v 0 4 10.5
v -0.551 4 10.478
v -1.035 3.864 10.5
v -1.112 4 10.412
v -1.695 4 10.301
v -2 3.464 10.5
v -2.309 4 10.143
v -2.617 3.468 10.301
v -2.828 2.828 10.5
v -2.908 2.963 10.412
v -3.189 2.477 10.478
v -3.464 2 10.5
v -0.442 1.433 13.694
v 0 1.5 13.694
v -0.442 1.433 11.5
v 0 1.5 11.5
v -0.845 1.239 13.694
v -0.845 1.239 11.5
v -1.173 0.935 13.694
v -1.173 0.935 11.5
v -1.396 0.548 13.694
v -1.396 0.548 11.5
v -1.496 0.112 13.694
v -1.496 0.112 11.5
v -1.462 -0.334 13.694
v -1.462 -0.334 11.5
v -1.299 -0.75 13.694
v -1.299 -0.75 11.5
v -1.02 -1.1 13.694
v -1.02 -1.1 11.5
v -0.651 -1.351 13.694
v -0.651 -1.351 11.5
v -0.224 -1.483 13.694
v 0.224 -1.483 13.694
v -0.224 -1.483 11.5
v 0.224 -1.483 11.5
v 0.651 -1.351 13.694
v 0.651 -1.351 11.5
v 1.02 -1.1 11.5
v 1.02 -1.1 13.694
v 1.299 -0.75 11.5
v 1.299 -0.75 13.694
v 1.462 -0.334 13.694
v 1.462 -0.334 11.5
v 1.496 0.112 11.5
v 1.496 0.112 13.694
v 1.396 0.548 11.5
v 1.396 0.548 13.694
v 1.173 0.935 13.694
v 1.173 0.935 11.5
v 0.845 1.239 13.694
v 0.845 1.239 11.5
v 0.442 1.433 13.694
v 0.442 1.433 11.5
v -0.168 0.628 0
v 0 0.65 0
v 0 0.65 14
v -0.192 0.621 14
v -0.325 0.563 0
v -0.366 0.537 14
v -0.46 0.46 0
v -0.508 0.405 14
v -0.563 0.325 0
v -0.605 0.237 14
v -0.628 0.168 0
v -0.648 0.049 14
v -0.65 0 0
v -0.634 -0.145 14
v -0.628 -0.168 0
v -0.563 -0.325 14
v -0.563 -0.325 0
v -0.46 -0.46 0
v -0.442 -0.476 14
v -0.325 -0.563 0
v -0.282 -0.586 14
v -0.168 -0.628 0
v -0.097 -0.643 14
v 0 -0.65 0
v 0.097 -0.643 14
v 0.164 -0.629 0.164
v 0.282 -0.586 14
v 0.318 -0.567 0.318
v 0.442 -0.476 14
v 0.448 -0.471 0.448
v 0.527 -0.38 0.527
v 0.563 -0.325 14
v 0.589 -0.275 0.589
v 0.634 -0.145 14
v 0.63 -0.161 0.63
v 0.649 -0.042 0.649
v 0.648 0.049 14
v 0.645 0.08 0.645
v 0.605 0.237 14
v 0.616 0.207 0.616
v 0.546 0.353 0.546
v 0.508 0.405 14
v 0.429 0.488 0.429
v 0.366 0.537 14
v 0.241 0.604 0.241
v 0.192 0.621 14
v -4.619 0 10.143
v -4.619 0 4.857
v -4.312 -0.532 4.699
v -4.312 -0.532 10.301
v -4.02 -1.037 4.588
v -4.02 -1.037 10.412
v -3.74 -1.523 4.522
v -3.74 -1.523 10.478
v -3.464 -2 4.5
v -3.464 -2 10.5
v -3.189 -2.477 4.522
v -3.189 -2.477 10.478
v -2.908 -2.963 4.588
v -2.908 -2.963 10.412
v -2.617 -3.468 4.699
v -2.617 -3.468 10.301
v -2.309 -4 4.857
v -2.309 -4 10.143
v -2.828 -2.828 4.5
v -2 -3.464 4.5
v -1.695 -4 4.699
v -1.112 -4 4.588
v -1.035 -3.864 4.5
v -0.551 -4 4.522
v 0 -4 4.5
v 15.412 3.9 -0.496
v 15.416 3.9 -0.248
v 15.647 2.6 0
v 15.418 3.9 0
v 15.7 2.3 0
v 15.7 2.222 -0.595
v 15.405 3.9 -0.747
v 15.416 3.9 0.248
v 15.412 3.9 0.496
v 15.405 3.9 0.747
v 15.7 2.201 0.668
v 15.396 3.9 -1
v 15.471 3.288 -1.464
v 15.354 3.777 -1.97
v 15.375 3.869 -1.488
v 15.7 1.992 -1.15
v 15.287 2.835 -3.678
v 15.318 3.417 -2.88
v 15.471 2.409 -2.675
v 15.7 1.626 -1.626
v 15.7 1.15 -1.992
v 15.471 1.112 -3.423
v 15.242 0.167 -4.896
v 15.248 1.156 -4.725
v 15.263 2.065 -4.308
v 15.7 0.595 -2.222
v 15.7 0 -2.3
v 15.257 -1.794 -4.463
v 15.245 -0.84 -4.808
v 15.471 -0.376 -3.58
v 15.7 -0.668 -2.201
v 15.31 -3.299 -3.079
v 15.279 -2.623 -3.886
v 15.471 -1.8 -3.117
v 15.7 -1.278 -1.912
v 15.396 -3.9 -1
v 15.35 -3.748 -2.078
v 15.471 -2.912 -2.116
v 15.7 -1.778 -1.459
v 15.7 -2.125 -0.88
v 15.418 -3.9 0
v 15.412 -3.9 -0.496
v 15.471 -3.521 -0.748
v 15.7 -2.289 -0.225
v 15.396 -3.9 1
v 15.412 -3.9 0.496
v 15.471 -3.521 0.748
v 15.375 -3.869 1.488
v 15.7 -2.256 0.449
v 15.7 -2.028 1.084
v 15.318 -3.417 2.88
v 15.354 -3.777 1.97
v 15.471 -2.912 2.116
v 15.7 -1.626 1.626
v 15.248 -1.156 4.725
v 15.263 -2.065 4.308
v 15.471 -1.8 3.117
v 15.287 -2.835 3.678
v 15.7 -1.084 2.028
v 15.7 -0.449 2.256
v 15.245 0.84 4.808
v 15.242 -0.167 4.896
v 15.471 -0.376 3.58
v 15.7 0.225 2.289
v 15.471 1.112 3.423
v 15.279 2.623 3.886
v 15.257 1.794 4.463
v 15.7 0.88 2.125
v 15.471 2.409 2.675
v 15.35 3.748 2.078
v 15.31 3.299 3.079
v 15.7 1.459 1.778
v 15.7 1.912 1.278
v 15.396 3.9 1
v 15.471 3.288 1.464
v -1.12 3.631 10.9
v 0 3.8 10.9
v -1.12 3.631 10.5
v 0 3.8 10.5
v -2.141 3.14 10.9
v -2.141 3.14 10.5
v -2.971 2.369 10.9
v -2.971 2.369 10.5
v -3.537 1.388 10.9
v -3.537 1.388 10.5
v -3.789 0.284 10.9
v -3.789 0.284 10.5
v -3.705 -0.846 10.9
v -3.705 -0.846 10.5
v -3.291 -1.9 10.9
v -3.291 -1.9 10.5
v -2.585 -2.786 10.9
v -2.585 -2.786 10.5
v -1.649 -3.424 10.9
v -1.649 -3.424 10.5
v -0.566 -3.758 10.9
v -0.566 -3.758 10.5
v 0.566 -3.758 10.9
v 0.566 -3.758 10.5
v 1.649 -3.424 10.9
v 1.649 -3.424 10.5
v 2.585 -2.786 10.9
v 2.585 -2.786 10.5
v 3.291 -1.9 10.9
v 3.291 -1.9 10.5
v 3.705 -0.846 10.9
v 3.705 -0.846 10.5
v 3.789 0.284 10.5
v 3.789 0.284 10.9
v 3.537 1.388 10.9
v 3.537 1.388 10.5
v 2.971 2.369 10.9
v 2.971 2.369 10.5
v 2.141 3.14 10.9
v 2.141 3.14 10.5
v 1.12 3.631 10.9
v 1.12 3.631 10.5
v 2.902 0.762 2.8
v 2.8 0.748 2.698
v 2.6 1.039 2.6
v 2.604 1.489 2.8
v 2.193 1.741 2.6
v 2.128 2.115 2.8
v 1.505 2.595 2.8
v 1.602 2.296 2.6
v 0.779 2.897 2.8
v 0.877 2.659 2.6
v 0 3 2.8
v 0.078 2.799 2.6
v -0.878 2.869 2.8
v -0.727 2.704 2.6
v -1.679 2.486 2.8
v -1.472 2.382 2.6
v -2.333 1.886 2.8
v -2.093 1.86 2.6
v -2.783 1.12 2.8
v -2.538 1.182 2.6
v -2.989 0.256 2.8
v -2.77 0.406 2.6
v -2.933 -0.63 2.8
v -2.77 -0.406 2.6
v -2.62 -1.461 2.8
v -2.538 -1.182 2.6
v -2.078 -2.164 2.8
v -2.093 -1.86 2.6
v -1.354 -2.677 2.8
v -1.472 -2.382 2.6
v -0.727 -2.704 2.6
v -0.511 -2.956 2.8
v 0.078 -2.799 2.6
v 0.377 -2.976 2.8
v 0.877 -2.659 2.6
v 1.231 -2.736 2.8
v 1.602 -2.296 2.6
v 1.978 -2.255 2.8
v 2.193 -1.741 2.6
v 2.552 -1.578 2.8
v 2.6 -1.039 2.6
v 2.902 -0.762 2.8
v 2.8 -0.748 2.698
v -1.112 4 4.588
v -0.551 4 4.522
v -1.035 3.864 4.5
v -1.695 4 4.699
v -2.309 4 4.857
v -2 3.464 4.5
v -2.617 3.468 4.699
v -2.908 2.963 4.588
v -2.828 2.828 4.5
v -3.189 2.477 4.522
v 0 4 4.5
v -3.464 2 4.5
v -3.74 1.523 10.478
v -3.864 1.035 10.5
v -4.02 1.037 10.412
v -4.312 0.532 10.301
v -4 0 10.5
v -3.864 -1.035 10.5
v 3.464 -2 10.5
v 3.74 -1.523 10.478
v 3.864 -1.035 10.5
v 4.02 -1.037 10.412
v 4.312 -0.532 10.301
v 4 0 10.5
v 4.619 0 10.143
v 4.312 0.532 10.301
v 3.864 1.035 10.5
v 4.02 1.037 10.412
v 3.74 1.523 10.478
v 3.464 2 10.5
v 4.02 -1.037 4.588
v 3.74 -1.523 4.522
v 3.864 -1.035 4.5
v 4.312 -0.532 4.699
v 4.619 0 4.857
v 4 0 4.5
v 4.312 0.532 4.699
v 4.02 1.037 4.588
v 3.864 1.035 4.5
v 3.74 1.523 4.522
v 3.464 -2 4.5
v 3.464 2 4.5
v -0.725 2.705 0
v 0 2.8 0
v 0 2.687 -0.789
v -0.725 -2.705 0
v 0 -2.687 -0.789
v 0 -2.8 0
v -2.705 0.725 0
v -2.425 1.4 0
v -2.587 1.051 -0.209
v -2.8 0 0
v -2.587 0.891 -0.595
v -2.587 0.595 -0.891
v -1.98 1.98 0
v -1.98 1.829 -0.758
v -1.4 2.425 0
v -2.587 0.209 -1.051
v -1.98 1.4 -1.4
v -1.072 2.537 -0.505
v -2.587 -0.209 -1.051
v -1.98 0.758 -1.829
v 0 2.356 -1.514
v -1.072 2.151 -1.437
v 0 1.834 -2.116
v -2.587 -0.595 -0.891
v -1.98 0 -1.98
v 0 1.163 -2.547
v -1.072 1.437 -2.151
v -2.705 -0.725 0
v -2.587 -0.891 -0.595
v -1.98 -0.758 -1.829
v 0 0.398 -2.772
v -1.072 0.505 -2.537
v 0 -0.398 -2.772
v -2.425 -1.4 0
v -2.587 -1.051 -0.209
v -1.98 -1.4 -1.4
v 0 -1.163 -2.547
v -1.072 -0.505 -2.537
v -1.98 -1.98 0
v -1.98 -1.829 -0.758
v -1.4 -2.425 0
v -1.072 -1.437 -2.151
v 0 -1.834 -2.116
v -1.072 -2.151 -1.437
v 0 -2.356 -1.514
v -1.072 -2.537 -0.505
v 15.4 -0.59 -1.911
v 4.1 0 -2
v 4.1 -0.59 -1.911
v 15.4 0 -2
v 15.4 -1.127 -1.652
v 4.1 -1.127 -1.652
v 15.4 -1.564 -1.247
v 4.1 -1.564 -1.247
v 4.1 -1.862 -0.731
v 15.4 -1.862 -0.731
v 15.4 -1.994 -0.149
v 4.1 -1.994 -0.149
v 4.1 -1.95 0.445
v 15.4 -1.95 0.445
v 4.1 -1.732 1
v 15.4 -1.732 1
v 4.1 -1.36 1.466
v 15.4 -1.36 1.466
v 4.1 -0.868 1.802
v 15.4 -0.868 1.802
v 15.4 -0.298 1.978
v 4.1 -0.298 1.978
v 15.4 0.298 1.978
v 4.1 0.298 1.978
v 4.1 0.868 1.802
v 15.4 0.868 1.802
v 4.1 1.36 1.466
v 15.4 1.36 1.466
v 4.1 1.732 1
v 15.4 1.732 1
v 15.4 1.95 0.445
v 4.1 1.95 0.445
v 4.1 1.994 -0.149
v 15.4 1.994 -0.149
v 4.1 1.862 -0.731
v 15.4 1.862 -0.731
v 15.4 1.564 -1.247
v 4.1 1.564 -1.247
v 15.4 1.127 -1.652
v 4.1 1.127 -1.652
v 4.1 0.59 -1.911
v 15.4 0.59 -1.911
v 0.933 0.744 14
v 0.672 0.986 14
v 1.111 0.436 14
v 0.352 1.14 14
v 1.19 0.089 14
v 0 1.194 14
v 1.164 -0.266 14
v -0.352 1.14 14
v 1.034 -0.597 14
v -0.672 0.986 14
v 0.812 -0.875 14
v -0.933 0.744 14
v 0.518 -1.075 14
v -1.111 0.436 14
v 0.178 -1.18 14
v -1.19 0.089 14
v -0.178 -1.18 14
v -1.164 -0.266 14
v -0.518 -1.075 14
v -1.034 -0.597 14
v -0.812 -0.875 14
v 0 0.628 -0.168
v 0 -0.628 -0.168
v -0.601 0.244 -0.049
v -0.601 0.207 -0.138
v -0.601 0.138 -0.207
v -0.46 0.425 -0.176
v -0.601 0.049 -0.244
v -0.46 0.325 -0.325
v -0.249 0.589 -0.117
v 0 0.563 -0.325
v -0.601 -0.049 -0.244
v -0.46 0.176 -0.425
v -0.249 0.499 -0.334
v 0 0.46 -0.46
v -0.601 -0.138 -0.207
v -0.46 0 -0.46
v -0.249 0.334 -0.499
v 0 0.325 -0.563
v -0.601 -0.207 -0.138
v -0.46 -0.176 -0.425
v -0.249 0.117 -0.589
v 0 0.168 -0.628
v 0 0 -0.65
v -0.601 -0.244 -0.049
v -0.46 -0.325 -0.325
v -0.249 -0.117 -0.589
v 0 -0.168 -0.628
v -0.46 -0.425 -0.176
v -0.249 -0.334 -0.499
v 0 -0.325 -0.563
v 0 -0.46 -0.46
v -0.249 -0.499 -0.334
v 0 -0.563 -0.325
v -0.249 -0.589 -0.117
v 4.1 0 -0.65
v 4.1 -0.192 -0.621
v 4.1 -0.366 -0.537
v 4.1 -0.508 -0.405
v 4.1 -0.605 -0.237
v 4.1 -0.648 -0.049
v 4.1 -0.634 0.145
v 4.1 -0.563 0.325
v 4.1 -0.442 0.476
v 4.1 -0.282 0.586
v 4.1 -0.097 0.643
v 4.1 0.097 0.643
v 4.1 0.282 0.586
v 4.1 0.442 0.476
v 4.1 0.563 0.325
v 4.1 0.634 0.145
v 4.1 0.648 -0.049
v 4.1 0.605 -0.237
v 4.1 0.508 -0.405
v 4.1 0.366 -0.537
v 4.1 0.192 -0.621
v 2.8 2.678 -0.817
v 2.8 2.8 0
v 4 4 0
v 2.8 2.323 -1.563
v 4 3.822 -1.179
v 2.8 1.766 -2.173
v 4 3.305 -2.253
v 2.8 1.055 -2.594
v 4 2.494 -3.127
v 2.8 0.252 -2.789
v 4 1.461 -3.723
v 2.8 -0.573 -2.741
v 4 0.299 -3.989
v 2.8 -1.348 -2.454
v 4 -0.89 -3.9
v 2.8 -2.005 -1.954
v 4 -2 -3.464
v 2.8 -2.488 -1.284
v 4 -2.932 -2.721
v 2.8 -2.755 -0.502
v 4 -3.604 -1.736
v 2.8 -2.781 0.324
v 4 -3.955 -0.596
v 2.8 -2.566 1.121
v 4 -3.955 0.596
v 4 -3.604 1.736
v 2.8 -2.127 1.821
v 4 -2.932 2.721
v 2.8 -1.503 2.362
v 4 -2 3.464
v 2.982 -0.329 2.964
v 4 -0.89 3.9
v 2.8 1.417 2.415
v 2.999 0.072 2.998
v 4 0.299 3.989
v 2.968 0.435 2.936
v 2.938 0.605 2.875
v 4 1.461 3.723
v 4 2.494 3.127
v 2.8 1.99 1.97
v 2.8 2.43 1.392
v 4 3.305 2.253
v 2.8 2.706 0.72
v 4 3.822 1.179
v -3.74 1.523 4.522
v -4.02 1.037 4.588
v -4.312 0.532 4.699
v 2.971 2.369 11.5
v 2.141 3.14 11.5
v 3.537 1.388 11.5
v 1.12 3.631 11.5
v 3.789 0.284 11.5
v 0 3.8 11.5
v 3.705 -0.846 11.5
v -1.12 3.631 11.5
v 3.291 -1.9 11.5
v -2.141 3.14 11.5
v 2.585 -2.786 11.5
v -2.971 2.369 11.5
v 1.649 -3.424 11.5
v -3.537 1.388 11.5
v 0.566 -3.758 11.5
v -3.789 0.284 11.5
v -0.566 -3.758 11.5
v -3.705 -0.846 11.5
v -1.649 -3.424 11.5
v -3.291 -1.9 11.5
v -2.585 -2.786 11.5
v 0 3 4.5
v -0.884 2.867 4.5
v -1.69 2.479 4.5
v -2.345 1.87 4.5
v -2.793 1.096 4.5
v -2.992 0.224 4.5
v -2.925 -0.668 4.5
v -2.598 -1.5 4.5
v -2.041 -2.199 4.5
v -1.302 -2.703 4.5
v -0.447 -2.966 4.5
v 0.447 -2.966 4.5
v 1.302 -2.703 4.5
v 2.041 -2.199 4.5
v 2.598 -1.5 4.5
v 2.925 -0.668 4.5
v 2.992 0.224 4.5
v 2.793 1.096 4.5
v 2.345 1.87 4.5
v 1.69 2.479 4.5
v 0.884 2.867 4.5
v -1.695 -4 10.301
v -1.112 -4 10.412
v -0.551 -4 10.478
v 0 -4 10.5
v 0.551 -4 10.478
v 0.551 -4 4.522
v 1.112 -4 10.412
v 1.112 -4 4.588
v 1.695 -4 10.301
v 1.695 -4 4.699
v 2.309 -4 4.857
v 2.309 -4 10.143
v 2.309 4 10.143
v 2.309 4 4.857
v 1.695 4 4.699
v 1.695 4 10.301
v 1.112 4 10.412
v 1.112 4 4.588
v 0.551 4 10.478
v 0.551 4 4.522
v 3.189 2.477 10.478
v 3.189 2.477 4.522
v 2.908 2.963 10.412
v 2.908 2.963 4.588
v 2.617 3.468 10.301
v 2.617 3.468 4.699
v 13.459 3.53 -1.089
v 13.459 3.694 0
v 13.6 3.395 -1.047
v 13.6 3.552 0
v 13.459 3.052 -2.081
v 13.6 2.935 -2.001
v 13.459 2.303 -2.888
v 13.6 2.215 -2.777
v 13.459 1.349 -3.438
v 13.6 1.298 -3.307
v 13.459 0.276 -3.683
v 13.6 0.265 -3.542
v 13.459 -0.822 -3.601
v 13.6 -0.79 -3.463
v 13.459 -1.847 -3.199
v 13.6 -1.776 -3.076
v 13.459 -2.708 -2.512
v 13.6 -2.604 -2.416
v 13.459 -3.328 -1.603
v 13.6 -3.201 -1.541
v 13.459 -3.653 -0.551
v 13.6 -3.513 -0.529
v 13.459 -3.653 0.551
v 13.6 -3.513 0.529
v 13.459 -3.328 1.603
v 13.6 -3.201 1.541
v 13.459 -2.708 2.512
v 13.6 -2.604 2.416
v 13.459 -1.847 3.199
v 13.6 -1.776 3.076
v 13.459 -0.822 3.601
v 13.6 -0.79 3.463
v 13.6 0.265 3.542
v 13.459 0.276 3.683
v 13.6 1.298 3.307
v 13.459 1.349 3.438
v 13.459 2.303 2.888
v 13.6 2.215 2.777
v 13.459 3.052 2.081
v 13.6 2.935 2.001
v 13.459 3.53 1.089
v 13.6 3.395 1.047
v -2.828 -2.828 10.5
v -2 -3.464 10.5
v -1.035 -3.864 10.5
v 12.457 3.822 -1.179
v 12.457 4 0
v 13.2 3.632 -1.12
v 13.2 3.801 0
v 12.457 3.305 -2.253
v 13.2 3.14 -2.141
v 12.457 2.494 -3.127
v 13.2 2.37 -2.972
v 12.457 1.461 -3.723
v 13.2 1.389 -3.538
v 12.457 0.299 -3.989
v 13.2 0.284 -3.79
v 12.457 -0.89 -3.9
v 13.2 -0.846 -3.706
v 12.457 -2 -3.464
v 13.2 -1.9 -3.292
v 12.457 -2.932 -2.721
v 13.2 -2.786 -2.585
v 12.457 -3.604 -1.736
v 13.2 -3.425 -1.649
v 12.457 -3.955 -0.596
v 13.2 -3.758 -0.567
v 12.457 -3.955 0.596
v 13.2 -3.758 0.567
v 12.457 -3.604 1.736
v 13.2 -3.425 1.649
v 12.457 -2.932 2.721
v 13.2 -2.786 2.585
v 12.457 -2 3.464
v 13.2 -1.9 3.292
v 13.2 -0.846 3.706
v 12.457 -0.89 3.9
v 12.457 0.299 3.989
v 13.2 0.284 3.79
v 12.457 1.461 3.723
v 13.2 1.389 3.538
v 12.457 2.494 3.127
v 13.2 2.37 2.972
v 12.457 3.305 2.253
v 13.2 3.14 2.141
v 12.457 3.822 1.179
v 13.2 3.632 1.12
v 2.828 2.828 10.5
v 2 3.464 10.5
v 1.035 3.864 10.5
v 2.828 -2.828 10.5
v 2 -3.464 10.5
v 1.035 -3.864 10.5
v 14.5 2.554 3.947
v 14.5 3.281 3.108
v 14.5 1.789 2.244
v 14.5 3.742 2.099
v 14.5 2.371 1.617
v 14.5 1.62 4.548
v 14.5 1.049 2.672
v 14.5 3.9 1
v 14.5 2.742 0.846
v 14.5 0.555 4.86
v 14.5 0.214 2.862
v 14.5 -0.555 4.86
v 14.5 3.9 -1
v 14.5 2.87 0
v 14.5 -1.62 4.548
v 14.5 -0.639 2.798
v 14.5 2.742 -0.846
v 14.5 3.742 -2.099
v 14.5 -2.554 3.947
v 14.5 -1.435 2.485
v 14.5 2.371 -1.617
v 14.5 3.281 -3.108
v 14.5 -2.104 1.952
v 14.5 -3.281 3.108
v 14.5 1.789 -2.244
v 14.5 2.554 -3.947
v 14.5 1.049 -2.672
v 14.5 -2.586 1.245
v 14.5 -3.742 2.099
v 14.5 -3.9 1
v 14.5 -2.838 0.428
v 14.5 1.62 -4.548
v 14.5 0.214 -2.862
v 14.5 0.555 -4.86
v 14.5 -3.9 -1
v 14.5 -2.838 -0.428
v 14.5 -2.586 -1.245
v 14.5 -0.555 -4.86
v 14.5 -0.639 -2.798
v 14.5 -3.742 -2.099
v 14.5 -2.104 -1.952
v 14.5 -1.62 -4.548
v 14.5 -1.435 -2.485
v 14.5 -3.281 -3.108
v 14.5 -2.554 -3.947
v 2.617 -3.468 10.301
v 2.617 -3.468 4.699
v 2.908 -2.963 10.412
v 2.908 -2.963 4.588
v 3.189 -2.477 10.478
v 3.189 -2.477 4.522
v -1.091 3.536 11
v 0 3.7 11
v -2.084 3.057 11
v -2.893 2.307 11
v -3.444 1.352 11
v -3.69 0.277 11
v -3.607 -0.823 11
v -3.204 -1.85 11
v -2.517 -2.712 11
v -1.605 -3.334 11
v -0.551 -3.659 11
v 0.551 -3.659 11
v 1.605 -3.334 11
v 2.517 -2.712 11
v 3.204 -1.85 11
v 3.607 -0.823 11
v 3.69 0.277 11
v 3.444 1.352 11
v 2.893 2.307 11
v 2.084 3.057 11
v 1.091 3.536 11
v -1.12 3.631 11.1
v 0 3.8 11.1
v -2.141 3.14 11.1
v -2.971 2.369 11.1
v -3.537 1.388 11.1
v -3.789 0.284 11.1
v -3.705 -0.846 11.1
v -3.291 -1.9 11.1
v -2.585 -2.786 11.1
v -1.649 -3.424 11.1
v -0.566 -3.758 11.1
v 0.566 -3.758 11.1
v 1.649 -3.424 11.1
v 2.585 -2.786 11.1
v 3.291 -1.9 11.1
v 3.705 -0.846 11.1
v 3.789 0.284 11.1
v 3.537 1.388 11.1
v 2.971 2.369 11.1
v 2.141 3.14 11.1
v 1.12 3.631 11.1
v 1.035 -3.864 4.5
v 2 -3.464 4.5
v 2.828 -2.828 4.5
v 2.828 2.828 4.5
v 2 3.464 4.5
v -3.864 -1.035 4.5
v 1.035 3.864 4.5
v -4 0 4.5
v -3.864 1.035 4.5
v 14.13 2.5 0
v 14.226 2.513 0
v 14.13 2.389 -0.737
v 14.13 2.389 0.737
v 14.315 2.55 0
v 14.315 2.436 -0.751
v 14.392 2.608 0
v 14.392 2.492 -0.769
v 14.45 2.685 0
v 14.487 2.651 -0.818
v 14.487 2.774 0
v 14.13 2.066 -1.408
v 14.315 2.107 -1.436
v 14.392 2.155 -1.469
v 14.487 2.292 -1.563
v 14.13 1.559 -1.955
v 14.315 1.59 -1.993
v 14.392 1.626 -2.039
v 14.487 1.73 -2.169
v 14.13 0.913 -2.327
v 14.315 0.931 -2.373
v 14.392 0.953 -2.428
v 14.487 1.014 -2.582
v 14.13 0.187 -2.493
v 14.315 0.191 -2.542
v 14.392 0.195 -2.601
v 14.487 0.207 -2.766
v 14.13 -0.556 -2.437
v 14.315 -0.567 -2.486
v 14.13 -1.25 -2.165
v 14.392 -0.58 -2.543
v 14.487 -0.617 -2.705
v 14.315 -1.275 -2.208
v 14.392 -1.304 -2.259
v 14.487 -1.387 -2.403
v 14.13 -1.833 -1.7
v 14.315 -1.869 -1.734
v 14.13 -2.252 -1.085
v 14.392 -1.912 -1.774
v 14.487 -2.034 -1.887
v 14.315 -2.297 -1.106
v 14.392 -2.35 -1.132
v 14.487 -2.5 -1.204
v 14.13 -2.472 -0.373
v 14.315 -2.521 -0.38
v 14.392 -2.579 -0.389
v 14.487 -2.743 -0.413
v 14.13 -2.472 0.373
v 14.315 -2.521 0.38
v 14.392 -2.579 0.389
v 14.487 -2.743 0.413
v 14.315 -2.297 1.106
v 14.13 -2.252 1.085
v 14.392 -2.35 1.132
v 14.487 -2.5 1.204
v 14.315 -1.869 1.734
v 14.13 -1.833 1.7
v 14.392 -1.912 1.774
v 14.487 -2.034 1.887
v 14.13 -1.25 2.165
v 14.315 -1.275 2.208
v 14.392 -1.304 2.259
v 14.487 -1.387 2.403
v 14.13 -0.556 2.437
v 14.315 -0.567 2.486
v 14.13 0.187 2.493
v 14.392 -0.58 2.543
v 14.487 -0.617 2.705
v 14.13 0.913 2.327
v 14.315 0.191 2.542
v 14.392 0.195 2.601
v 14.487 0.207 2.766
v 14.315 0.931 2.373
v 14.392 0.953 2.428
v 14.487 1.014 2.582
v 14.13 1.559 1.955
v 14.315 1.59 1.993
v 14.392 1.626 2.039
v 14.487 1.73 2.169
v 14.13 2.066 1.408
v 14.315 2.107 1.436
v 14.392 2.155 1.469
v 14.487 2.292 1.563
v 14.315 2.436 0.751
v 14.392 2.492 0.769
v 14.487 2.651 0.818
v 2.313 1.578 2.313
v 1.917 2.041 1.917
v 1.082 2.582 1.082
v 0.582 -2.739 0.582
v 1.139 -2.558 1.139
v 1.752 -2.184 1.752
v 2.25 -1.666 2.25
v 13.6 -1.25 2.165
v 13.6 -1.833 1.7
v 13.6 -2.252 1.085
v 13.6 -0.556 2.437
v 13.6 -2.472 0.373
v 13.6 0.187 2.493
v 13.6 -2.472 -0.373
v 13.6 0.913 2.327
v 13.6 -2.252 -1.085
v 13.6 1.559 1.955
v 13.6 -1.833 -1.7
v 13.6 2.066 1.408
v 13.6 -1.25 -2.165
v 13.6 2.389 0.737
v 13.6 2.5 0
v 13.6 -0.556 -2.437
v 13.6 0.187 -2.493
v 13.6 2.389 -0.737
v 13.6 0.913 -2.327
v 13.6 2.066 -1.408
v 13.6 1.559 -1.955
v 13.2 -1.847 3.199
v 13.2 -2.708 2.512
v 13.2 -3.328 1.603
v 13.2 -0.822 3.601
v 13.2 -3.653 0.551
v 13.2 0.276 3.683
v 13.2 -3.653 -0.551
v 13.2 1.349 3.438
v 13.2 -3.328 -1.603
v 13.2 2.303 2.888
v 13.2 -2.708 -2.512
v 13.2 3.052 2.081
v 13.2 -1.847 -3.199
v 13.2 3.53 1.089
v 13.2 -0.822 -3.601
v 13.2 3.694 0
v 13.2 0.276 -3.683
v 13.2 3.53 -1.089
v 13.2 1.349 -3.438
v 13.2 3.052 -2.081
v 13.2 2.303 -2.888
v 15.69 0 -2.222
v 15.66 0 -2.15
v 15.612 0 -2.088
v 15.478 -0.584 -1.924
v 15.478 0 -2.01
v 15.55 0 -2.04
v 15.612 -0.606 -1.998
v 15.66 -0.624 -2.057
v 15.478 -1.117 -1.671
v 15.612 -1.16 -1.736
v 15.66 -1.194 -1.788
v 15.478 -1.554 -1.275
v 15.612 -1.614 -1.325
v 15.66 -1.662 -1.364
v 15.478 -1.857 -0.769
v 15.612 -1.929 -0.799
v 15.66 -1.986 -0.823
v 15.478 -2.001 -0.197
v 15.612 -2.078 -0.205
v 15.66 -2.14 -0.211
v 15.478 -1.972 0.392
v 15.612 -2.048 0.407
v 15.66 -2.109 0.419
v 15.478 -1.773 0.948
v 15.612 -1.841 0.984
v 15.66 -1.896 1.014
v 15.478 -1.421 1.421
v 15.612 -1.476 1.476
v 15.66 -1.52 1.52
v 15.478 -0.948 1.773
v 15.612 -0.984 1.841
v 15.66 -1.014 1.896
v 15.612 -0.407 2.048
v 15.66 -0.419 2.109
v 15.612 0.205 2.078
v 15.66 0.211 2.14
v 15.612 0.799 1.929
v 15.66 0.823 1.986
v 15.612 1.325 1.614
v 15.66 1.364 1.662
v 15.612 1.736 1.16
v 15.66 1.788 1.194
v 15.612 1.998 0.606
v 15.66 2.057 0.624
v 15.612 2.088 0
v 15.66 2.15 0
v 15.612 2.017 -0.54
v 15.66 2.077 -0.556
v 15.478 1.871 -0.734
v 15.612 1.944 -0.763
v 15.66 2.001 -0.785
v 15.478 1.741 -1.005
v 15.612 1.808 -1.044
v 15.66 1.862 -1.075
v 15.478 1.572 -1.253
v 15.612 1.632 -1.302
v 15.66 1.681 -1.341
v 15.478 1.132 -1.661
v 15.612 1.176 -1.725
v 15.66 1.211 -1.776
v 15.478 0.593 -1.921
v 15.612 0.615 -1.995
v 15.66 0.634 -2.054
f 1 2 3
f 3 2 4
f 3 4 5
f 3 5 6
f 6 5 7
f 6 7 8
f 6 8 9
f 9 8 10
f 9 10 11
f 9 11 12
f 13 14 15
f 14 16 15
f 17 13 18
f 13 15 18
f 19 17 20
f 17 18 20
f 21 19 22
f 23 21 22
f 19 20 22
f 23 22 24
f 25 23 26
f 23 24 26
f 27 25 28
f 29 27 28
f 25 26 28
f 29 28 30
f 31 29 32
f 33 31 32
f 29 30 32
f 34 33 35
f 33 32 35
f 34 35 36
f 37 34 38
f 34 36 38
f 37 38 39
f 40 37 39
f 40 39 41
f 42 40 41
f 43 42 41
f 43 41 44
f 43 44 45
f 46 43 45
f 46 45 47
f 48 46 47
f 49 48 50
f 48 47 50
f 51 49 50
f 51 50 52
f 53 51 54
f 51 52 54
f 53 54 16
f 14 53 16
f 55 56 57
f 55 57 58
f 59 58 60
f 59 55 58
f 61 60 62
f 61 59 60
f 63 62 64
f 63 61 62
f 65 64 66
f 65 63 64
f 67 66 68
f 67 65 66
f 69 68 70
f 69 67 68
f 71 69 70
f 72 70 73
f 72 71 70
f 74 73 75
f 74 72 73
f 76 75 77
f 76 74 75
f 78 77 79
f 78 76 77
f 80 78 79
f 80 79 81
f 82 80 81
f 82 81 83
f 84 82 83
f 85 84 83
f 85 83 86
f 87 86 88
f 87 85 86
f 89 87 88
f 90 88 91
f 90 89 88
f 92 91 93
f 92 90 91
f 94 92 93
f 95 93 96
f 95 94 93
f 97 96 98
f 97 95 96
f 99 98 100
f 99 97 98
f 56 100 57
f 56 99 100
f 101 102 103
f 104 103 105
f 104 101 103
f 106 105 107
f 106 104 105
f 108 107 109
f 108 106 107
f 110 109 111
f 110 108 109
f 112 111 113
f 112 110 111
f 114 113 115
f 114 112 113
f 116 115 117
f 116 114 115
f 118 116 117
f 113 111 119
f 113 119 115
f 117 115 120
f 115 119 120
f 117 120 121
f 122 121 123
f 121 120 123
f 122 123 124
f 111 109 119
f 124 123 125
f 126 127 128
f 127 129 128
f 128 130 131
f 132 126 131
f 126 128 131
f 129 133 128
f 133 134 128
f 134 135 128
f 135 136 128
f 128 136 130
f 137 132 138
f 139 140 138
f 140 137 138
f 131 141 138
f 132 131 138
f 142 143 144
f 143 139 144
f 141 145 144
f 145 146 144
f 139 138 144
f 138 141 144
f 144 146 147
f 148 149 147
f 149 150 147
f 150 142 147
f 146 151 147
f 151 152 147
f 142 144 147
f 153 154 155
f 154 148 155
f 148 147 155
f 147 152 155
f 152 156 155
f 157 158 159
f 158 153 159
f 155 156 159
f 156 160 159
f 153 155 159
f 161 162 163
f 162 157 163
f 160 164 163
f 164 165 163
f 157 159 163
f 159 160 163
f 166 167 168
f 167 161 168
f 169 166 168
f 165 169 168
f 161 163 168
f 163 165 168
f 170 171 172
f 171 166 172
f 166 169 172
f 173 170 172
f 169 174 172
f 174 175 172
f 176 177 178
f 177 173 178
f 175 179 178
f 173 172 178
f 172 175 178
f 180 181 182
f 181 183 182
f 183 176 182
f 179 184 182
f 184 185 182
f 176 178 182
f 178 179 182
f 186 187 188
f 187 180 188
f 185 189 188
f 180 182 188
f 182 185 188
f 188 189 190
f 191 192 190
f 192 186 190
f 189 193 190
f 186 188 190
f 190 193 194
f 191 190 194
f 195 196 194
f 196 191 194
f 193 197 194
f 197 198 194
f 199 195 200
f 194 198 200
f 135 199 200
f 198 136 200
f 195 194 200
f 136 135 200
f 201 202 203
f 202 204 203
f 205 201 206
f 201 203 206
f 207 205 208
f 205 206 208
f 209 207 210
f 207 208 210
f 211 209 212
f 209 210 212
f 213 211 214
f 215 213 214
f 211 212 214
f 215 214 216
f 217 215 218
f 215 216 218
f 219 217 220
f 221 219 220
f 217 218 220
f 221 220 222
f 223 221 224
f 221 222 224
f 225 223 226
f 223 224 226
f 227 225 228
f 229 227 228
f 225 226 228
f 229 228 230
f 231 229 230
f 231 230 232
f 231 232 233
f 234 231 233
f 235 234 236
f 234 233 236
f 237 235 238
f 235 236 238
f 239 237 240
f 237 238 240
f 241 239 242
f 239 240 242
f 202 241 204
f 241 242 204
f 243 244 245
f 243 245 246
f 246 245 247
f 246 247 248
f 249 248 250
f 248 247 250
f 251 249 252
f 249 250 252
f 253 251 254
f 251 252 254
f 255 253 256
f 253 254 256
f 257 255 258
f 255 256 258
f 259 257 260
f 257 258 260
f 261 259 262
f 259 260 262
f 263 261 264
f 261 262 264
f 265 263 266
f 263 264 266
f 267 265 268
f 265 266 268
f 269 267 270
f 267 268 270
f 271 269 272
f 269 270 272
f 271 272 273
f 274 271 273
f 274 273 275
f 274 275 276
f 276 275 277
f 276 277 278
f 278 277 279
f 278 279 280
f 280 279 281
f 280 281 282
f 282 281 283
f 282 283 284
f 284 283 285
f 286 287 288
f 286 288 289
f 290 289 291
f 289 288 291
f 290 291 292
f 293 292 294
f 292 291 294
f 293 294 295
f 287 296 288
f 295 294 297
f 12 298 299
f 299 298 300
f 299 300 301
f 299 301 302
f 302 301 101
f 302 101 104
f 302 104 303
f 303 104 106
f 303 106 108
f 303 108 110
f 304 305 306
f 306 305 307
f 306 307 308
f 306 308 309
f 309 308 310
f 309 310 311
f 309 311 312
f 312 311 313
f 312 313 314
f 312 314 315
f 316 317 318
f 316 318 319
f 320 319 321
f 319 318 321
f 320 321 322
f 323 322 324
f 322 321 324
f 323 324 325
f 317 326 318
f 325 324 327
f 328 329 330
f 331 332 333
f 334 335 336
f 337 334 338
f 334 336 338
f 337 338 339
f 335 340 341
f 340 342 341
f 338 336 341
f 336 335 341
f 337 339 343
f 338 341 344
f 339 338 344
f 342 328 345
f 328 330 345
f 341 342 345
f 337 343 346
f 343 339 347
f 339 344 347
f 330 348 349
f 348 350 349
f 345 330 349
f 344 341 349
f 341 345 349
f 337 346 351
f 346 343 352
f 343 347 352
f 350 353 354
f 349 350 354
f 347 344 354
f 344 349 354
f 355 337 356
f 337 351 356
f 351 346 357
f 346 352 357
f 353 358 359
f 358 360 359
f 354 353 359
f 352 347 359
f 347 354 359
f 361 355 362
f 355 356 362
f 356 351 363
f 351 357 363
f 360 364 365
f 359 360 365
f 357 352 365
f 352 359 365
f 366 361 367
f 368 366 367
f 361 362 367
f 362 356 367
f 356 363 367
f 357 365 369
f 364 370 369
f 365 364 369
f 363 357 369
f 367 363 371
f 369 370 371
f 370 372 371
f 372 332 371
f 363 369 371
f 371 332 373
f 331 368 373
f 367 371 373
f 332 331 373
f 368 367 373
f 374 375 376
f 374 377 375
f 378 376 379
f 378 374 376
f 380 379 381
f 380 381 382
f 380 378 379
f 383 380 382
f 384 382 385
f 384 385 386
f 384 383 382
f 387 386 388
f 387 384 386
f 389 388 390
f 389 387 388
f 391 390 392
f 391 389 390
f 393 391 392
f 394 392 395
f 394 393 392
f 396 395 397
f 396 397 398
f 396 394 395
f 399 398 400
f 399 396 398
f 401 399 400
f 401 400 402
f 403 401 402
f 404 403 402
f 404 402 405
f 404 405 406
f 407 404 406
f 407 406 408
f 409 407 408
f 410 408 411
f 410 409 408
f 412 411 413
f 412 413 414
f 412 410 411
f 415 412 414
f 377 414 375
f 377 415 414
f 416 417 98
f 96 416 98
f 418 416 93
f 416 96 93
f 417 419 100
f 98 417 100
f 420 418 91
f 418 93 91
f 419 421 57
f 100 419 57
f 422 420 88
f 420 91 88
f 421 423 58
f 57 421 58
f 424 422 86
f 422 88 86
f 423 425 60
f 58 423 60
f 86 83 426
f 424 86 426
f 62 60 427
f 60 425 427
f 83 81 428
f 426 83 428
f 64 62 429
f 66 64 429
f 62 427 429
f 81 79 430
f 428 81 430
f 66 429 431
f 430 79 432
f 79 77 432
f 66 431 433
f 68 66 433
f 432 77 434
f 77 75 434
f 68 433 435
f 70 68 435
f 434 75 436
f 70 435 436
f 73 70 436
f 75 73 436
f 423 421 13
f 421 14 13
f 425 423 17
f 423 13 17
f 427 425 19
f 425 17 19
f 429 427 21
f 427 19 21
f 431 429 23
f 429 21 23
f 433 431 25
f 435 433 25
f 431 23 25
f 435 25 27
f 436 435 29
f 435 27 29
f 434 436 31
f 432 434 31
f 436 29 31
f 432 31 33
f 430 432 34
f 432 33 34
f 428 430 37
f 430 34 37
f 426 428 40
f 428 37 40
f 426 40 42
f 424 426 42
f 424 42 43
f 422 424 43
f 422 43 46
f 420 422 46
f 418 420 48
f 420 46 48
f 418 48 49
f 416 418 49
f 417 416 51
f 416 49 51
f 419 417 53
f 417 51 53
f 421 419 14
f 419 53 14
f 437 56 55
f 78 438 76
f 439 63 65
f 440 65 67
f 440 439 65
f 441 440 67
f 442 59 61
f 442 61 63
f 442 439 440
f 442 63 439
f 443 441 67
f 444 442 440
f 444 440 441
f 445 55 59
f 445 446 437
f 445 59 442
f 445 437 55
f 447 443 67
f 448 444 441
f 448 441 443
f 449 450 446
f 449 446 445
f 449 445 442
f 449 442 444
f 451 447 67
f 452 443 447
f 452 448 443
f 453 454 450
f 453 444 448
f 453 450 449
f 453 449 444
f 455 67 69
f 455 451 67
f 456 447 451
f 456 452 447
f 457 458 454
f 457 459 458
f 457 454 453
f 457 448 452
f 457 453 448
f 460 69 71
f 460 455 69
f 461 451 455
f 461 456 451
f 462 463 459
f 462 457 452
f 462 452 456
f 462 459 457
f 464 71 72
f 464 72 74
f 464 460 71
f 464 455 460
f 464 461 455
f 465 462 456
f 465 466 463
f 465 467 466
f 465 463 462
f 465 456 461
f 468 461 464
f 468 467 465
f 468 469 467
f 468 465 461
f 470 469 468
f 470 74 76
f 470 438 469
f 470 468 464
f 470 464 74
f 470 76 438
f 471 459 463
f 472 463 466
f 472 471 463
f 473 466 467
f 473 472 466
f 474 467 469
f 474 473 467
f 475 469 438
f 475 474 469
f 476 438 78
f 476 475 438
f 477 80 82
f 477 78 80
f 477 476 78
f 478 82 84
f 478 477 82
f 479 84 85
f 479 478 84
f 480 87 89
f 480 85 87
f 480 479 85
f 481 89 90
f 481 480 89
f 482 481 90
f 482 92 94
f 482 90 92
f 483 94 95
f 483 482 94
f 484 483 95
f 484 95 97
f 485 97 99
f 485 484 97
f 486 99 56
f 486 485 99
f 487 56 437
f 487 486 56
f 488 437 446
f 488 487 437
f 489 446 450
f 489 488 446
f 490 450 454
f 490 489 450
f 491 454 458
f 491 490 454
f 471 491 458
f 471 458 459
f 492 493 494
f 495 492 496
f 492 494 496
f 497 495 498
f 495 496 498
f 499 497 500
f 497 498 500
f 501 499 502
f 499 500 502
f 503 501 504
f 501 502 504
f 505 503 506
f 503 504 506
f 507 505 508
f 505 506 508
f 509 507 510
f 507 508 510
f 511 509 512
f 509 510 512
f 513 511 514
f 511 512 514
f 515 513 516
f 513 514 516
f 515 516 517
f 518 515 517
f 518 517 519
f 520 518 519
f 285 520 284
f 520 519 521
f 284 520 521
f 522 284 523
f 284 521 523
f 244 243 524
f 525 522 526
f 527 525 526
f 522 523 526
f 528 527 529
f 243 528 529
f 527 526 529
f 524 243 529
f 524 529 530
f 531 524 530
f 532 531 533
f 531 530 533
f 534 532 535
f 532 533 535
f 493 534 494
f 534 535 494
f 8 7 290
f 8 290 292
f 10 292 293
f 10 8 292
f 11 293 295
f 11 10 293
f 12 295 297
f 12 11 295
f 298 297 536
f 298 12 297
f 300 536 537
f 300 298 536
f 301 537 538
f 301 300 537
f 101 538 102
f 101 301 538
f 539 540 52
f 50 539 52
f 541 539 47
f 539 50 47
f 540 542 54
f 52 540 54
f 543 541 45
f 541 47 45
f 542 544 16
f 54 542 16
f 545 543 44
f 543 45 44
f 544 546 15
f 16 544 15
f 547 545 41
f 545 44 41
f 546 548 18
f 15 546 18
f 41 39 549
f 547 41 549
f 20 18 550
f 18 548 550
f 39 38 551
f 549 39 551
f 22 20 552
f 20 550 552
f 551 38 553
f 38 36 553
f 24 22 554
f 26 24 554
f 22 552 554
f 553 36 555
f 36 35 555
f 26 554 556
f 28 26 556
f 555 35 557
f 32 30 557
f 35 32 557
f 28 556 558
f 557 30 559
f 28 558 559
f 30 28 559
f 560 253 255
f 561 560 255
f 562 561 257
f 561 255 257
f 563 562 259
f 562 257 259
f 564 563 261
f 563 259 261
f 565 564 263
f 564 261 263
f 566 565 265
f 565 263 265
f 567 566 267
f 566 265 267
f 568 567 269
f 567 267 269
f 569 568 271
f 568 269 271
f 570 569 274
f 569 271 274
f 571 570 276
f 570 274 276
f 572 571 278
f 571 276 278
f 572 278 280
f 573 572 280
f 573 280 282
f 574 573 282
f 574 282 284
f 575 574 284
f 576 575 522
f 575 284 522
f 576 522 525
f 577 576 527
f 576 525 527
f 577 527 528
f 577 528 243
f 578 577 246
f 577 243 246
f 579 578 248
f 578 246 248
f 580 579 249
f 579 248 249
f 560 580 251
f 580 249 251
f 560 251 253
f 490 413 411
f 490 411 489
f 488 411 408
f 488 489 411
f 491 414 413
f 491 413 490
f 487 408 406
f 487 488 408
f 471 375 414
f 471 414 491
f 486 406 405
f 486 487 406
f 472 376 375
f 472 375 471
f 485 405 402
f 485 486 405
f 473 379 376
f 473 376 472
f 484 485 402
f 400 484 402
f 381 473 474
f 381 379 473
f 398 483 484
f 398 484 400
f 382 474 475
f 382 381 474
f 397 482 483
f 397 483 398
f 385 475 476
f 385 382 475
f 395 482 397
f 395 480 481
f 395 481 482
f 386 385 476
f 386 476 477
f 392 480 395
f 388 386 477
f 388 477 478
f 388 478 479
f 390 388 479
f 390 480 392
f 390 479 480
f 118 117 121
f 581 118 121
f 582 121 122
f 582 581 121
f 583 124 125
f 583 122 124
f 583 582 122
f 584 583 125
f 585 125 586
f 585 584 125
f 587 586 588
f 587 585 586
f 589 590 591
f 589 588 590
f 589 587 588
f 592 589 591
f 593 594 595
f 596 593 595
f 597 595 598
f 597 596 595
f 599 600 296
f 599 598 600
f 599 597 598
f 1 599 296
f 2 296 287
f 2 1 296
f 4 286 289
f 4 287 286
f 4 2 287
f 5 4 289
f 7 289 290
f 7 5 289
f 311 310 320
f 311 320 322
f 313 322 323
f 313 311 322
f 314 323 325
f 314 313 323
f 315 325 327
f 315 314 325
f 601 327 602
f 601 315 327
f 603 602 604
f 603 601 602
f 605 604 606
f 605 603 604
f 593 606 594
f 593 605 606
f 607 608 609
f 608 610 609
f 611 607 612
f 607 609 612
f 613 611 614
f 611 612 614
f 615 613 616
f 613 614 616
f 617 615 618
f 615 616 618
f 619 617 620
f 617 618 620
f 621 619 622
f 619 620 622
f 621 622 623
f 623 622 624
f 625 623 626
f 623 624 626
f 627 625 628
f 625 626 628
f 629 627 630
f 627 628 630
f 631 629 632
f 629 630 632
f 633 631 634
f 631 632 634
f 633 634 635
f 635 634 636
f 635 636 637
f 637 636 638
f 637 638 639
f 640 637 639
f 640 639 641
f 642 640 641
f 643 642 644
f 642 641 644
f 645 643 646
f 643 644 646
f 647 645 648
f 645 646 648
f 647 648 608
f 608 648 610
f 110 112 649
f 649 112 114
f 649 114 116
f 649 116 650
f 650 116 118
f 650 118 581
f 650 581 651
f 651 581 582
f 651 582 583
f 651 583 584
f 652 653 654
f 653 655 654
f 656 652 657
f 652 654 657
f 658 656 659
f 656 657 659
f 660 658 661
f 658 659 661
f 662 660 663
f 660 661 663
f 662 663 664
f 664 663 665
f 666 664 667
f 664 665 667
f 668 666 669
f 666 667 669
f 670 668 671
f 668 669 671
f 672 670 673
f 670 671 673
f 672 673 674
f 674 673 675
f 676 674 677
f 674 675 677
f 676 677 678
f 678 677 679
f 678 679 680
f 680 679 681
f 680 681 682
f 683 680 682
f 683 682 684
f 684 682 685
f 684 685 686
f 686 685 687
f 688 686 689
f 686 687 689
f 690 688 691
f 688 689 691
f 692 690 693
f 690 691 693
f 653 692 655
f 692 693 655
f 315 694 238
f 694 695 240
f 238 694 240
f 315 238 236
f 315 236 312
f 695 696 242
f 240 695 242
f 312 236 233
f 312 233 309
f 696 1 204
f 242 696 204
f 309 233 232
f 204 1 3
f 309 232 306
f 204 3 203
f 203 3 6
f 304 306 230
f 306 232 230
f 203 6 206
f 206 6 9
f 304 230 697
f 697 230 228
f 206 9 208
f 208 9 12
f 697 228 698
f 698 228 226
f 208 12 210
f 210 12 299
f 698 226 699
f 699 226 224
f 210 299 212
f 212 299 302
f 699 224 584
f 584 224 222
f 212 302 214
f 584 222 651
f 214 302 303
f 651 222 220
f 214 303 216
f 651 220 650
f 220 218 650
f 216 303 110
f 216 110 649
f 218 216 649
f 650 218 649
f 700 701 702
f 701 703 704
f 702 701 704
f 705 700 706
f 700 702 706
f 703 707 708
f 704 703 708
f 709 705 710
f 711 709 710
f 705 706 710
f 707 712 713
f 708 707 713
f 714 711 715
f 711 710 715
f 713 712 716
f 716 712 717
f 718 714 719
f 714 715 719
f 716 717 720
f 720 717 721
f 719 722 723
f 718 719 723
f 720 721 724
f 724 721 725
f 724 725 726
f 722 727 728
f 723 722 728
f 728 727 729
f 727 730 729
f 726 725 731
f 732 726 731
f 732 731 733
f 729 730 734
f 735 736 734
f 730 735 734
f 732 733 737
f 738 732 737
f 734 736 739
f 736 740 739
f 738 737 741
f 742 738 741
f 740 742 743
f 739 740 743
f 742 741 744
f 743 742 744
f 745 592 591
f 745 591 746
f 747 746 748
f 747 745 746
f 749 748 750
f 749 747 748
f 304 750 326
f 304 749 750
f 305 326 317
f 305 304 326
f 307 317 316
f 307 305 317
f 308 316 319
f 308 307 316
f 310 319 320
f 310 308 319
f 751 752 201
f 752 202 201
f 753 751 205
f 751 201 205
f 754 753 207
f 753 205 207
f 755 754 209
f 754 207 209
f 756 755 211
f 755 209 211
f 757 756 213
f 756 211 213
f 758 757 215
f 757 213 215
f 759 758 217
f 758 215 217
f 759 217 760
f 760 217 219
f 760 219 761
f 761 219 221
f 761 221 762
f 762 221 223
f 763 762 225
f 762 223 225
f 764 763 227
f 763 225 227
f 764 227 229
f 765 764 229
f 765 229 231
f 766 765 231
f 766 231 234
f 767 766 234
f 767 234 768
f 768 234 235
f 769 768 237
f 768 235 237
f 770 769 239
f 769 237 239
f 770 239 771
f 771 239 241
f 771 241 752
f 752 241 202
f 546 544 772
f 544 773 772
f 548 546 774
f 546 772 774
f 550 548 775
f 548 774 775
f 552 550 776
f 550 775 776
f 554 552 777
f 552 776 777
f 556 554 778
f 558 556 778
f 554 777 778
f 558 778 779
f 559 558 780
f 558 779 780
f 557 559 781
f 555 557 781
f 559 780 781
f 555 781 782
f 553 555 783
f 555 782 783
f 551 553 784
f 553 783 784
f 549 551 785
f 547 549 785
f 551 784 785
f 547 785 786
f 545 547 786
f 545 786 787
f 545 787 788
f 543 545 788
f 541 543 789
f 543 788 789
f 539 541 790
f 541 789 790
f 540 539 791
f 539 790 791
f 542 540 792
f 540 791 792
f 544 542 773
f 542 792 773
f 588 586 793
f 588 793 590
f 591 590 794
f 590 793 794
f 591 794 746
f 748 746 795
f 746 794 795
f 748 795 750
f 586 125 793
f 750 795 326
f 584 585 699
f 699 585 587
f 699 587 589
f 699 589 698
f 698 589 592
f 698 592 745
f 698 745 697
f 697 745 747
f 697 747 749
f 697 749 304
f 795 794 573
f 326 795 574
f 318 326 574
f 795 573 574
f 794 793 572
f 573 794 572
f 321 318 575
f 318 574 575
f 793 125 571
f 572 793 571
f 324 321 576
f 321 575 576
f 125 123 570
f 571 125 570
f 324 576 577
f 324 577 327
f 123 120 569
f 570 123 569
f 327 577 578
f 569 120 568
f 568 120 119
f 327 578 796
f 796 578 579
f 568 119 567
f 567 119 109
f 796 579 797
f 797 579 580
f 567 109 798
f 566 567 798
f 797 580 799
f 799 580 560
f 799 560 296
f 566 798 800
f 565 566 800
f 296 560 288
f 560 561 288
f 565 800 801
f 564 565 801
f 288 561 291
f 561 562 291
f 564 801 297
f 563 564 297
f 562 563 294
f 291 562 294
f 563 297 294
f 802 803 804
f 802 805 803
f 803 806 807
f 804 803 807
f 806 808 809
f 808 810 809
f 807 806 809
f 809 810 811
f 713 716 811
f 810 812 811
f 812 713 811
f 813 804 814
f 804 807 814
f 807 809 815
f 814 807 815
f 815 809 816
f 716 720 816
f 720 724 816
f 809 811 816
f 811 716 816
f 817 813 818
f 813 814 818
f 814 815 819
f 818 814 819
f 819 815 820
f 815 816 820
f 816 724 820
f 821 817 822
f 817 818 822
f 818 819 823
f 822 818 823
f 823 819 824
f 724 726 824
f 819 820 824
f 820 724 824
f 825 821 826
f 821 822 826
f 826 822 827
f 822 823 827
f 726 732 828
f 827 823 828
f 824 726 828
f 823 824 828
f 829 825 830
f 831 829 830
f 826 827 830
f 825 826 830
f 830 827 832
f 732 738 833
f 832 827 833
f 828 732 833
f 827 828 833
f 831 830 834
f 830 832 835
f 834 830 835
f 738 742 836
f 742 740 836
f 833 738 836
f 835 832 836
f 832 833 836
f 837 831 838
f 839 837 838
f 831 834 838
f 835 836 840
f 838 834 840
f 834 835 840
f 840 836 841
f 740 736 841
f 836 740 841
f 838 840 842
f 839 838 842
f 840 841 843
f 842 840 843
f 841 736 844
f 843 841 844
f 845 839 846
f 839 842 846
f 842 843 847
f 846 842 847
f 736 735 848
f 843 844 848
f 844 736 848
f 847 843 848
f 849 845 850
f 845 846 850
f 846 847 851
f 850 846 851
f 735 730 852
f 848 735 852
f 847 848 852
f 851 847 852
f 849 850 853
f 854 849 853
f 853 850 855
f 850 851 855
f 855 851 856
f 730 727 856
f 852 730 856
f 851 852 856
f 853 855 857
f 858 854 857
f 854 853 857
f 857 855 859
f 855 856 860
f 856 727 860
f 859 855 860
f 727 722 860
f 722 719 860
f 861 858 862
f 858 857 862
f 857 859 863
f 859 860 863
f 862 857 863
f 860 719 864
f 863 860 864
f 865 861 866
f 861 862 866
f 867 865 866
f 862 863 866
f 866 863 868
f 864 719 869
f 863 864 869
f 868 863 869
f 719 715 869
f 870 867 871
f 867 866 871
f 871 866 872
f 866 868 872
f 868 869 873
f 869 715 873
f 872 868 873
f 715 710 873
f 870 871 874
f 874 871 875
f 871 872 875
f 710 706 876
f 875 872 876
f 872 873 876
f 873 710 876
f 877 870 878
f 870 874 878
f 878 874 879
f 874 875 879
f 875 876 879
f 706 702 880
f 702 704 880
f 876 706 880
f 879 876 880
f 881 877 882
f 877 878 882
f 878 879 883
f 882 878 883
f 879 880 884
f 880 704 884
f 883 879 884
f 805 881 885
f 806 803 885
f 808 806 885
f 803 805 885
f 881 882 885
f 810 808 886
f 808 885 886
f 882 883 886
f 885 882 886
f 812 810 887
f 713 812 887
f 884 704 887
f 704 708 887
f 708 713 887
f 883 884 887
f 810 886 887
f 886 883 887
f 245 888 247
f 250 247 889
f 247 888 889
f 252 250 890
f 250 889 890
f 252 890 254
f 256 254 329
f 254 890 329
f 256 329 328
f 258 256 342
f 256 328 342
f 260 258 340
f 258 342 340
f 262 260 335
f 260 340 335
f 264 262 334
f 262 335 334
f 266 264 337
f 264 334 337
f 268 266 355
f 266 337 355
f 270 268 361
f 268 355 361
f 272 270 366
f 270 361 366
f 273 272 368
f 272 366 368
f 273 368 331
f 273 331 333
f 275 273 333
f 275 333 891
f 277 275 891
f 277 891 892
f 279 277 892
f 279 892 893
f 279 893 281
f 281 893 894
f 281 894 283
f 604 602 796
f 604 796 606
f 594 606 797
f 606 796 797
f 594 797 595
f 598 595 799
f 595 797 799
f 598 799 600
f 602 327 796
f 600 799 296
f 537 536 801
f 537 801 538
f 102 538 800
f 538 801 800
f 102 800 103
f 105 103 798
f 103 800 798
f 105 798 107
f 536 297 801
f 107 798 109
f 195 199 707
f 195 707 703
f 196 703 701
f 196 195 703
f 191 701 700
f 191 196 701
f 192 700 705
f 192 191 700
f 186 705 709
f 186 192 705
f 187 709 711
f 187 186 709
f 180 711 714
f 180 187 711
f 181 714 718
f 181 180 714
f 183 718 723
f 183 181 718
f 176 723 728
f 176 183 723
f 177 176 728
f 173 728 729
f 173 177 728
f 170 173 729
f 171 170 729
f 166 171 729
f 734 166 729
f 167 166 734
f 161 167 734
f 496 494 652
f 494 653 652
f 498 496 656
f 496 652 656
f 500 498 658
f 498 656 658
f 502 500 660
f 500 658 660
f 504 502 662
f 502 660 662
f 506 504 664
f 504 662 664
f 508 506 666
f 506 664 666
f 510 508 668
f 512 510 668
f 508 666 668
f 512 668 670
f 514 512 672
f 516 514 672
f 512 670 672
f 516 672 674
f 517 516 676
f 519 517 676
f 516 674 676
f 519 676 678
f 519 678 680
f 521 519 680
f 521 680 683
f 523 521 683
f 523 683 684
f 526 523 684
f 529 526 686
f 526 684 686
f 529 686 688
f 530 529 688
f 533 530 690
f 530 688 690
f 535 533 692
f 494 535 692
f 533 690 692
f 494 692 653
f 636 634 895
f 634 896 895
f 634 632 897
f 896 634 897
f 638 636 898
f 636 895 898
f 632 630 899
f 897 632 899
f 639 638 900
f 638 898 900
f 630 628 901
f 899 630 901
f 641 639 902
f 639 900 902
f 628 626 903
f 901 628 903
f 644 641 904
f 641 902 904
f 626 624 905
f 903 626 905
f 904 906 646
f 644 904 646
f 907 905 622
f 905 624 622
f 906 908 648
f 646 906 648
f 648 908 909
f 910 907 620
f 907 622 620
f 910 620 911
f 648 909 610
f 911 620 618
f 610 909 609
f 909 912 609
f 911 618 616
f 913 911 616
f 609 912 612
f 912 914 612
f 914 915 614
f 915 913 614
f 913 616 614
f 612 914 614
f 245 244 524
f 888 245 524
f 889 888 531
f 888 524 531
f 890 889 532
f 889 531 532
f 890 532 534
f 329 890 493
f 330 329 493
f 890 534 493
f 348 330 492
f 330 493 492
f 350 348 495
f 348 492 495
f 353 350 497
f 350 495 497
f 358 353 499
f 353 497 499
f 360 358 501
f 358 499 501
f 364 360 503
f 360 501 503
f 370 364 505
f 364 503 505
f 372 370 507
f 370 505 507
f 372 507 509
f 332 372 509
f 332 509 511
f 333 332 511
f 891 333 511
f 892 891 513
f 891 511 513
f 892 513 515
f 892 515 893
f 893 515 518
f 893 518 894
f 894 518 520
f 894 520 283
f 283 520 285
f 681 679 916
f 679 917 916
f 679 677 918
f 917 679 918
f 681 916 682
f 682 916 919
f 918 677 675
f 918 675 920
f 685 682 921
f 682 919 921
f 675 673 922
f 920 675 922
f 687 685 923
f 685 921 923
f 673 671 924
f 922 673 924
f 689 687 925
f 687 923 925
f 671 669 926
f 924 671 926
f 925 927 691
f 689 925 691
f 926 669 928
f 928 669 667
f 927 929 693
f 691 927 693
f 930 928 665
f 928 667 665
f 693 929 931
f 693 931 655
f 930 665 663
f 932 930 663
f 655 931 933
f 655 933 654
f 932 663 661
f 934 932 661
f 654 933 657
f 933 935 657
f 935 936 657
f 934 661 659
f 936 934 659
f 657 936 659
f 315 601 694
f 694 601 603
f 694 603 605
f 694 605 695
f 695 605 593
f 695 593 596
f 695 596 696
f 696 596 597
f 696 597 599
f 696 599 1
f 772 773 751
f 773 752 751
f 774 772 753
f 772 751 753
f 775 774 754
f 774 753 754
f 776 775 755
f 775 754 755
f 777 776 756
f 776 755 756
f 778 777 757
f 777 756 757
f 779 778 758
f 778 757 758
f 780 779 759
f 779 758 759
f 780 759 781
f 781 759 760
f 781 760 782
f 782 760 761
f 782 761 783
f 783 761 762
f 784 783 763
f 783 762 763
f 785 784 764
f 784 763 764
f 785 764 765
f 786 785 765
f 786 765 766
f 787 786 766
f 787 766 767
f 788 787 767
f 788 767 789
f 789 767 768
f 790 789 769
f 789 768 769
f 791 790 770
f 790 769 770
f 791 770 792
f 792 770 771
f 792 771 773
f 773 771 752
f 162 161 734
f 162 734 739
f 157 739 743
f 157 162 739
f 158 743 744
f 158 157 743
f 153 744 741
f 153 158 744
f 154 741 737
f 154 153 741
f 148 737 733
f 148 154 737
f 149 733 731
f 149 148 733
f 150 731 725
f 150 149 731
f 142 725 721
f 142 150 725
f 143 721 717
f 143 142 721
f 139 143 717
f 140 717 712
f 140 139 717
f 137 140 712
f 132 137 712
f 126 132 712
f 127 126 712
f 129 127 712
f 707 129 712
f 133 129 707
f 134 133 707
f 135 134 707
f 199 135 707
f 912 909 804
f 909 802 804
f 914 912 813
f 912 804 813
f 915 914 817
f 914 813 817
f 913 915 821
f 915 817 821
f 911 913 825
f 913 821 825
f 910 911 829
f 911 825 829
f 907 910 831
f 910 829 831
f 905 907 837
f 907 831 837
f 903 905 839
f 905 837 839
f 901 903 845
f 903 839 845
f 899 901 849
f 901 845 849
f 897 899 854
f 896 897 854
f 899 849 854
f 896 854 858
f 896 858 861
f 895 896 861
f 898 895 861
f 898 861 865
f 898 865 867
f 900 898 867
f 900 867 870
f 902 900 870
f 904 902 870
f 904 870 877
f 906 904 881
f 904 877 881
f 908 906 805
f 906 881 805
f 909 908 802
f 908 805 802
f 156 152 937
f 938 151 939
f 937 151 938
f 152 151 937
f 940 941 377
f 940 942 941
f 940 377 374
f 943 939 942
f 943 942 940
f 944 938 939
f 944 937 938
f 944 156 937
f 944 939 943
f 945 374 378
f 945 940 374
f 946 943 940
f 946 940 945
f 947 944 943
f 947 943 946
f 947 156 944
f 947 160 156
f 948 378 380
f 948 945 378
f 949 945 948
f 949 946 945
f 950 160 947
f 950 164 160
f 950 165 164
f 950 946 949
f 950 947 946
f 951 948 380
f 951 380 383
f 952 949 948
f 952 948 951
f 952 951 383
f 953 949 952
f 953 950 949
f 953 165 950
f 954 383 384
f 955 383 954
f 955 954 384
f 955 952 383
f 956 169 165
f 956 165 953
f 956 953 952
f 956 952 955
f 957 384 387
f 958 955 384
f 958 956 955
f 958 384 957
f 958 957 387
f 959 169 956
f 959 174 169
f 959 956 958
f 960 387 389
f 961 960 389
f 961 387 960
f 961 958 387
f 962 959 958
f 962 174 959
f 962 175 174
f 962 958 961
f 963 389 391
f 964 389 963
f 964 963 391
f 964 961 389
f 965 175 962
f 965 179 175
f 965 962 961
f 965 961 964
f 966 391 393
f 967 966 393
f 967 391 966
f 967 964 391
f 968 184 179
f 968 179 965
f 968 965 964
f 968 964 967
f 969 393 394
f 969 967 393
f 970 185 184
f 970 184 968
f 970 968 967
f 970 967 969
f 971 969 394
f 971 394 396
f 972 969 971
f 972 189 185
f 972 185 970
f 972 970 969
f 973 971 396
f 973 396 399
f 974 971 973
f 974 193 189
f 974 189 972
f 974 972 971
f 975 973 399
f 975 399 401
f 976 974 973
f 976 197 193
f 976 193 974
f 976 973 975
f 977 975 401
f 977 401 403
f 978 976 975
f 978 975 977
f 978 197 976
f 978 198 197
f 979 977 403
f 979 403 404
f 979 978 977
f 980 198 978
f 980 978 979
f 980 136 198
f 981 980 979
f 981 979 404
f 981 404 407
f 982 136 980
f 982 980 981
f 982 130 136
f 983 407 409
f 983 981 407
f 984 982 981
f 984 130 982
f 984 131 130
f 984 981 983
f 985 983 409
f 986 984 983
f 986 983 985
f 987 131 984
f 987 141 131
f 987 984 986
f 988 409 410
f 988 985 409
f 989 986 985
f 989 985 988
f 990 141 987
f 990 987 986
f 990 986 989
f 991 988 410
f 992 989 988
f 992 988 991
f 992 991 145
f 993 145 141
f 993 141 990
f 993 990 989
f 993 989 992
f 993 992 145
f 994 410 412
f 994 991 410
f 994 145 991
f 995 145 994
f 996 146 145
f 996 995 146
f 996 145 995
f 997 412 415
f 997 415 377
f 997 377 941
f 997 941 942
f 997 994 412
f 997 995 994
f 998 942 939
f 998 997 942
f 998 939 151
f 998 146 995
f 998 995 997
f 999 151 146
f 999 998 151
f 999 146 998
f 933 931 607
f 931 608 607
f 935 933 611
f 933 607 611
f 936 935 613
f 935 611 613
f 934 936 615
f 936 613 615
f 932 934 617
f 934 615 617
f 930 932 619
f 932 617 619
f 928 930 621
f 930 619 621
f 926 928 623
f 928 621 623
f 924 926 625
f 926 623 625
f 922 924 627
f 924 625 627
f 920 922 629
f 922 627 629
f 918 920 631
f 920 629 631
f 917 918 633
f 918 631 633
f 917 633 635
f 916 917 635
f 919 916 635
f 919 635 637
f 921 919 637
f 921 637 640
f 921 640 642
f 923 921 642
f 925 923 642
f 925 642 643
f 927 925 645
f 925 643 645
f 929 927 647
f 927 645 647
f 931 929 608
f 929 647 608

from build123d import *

# Parameters (mm, degrees)
CUT_EXTRUDE1_DEPTH = 1.2
SKETCH5_W          = 14
SKETCH5_H          = 0.65
SKETCH7_W          = 16
SKETCH7_H          = 16
CUT_EXTRUDE2_DEPTH = 7.055555556


with BuildPart() as part:
    # Sketch1 → Revolve1 (revolve)
    with BuildSketch(Plane.XY):
        with BuildLine():
            Line((0, 2.8), (2.8, 2.8))
            Line((2.8, 2.8), (4, 4))
            Line((4, 4), (12.457142857, 4))
            Line((12.457142857, 4), (13.2, 3.800952028))
            Line((13.2, 3.800952028), (13.2, 3.693772352))
            Line((13.2, 3.693772352), (13.458578644, 3.693772352))
            Line((13.458578644, 3.693772352), (13.6, 3.552350995))
            Line((13.6, 3.552350995), (13.6, 2.5))
            Line((13.6, 2.5), (14.13, 2.5))
            ThreePointArc((14.13, 2.5), (14.391629509, 2.608370491), (14.5, 2.87))
            Line((14.5, 2.87), (14.5, 5.9))
            Line((14.5, 5.9), (14.897402943, 5.9))
            ThreePointArc((14.897402943, 5.9), (15.025960465, 5.853208889), (15.094364494, 5.734729636))
            Line((15.094364494, 5.734729636), (15.7, 2.3))
            Line((15.7, 2.3), (15.7, 0))
            Line((15.7, 0), (-2.8, 0))
            ThreePointArc((-2.8, 0), (-1.979898987, 1.979898987), (0, 2.8))
        make_face()
    revolve(axis=Axis((15.7, 0, 0), (-1, 0, 0)))

    # Sketch2 → Revolve2 (revolve)
    with BuildSketch(Plane(origin=(0, 0, 0), x_dir=(0, 0, -1), z_dir=(1, 0, 0))):
        Polygon((-11.5, 0), (-11.5, 3.8), (-11.1, 3.8), (-11, 3.7), (-10.9, 3.8), (-10.5, 3.8), (-10.5, 4), (-10.130495828, 4.64), (-4.869504172, 4.64), (-4.5, 4), (-4.5, 3), (-2.8, 3), (-2.6, 2.8), (0, 2.8), (0, 0), align=None)
    revolve(axis=Axis((0, 0, 0), (0, 0, 1)))

    # Sketch3 → Revolve3 (revolve)
    with BuildSketch(Plane(origin=(0, 0, 0), x_dir=(0, 0, -1), z_dir=(1, 0, 0))):
        Polygon((-14, 0), (-14, 1.1935), (-13.6935, 1.5), (-11.5, 1.5), (-11.5, 0), align=None)
    revolve(axis=Axis((0, 0, 11.5), (0, 0, 1)))

    # Sketch4 → Cut-Extrude1 (cut)
    with BuildSketch(Plane(origin=(15.7, 0, 0), x_dir=(0, 0, -1), z_dir=(1, 0, 0))):
        Polygon((-9.8, -5.658032638), (0, -11.316065276), (9.8, -5.658032638), (9.8, 5.658032638), (0, 11.316065276), (-9.8, 5.658032638), align=None)
        with BuildLine():
            Line((-1, -3.9), (1, -3.9))
            ThreePointArc((1, -3.9), (4.9, 0), (1, 3.9))
            Line((1, 3.9), (-1, 3.9))
            ThreePointArc((-1, 3.9), (-4.9, 0), (-1, -3.9))
        make_face(mode=Mode.SUBTRACT)
    extrude(amount=-CUT_EXTRUDE1_DEPTH, mode=Mode.SUBTRACT)

    # Sketch5 → Cut-Revolve1 (revolve, cut)
    with BuildSketch(Plane(origin=(0, 0, 0), x_dir=(0, 0, -1), z_dir=(1, 0, 0))):
        with Locations((-7, 0.325)):
            Rectangle(SKETCH5_W, SKETCH5_H)
    revolve(axis=Axis((0, 0, 0), (0, 0, 1)), mode=Mode.SUBTRACT)

    # Sketch6 → Cut-Revolve2 (revolve, cut)
    with BuildSketch(Plane(origin=(0, 0, 0), x_dir=(1, 0, 0), z_dir=(0, 1, 0))):
        with BuildLine():
            Line((0, 0.65), (4.1, 0.65))
            Line((4.1, 0.65), (4.1, 2))
            Line((4.1, 2), (15.4, 2))
            ThreePointArc((15.4, 2), (15.612132034, 2.087867966), (15.7, 2.3))
            Line((15.7, 2.3), (15.7, 0))
            Line((15.7, 0), (-0.65, 0))
            ThreePointArc((-0.65, 0), (-0.459619408, 0.459619408), (0, 0.65))
        make_face()
    revolve(axis=Axis((15.7, 0, 0), (-1, 0, 0)), mode=Mode.SUBTRACT)

    # Sketch7 → Cut-Extrude2 (cut)
    with BuildSketch(Plane.XY.offset(11.5)):
        Rectangle(SKETCH7_W, SKETCH7_H)
        Polygon((-4.618802154, 0), (-2.309401077, -4), (2.309401077, -4), (4.618802154, 0), (2.309401077, 4), (-2.309401077, 4), align=None, mode=Mode.SUBTRACT)
    extrude(amount=-CUT_EXTRUDE2_DEPTH, mode=Mode.SUBTRACT)


solid = part.part
